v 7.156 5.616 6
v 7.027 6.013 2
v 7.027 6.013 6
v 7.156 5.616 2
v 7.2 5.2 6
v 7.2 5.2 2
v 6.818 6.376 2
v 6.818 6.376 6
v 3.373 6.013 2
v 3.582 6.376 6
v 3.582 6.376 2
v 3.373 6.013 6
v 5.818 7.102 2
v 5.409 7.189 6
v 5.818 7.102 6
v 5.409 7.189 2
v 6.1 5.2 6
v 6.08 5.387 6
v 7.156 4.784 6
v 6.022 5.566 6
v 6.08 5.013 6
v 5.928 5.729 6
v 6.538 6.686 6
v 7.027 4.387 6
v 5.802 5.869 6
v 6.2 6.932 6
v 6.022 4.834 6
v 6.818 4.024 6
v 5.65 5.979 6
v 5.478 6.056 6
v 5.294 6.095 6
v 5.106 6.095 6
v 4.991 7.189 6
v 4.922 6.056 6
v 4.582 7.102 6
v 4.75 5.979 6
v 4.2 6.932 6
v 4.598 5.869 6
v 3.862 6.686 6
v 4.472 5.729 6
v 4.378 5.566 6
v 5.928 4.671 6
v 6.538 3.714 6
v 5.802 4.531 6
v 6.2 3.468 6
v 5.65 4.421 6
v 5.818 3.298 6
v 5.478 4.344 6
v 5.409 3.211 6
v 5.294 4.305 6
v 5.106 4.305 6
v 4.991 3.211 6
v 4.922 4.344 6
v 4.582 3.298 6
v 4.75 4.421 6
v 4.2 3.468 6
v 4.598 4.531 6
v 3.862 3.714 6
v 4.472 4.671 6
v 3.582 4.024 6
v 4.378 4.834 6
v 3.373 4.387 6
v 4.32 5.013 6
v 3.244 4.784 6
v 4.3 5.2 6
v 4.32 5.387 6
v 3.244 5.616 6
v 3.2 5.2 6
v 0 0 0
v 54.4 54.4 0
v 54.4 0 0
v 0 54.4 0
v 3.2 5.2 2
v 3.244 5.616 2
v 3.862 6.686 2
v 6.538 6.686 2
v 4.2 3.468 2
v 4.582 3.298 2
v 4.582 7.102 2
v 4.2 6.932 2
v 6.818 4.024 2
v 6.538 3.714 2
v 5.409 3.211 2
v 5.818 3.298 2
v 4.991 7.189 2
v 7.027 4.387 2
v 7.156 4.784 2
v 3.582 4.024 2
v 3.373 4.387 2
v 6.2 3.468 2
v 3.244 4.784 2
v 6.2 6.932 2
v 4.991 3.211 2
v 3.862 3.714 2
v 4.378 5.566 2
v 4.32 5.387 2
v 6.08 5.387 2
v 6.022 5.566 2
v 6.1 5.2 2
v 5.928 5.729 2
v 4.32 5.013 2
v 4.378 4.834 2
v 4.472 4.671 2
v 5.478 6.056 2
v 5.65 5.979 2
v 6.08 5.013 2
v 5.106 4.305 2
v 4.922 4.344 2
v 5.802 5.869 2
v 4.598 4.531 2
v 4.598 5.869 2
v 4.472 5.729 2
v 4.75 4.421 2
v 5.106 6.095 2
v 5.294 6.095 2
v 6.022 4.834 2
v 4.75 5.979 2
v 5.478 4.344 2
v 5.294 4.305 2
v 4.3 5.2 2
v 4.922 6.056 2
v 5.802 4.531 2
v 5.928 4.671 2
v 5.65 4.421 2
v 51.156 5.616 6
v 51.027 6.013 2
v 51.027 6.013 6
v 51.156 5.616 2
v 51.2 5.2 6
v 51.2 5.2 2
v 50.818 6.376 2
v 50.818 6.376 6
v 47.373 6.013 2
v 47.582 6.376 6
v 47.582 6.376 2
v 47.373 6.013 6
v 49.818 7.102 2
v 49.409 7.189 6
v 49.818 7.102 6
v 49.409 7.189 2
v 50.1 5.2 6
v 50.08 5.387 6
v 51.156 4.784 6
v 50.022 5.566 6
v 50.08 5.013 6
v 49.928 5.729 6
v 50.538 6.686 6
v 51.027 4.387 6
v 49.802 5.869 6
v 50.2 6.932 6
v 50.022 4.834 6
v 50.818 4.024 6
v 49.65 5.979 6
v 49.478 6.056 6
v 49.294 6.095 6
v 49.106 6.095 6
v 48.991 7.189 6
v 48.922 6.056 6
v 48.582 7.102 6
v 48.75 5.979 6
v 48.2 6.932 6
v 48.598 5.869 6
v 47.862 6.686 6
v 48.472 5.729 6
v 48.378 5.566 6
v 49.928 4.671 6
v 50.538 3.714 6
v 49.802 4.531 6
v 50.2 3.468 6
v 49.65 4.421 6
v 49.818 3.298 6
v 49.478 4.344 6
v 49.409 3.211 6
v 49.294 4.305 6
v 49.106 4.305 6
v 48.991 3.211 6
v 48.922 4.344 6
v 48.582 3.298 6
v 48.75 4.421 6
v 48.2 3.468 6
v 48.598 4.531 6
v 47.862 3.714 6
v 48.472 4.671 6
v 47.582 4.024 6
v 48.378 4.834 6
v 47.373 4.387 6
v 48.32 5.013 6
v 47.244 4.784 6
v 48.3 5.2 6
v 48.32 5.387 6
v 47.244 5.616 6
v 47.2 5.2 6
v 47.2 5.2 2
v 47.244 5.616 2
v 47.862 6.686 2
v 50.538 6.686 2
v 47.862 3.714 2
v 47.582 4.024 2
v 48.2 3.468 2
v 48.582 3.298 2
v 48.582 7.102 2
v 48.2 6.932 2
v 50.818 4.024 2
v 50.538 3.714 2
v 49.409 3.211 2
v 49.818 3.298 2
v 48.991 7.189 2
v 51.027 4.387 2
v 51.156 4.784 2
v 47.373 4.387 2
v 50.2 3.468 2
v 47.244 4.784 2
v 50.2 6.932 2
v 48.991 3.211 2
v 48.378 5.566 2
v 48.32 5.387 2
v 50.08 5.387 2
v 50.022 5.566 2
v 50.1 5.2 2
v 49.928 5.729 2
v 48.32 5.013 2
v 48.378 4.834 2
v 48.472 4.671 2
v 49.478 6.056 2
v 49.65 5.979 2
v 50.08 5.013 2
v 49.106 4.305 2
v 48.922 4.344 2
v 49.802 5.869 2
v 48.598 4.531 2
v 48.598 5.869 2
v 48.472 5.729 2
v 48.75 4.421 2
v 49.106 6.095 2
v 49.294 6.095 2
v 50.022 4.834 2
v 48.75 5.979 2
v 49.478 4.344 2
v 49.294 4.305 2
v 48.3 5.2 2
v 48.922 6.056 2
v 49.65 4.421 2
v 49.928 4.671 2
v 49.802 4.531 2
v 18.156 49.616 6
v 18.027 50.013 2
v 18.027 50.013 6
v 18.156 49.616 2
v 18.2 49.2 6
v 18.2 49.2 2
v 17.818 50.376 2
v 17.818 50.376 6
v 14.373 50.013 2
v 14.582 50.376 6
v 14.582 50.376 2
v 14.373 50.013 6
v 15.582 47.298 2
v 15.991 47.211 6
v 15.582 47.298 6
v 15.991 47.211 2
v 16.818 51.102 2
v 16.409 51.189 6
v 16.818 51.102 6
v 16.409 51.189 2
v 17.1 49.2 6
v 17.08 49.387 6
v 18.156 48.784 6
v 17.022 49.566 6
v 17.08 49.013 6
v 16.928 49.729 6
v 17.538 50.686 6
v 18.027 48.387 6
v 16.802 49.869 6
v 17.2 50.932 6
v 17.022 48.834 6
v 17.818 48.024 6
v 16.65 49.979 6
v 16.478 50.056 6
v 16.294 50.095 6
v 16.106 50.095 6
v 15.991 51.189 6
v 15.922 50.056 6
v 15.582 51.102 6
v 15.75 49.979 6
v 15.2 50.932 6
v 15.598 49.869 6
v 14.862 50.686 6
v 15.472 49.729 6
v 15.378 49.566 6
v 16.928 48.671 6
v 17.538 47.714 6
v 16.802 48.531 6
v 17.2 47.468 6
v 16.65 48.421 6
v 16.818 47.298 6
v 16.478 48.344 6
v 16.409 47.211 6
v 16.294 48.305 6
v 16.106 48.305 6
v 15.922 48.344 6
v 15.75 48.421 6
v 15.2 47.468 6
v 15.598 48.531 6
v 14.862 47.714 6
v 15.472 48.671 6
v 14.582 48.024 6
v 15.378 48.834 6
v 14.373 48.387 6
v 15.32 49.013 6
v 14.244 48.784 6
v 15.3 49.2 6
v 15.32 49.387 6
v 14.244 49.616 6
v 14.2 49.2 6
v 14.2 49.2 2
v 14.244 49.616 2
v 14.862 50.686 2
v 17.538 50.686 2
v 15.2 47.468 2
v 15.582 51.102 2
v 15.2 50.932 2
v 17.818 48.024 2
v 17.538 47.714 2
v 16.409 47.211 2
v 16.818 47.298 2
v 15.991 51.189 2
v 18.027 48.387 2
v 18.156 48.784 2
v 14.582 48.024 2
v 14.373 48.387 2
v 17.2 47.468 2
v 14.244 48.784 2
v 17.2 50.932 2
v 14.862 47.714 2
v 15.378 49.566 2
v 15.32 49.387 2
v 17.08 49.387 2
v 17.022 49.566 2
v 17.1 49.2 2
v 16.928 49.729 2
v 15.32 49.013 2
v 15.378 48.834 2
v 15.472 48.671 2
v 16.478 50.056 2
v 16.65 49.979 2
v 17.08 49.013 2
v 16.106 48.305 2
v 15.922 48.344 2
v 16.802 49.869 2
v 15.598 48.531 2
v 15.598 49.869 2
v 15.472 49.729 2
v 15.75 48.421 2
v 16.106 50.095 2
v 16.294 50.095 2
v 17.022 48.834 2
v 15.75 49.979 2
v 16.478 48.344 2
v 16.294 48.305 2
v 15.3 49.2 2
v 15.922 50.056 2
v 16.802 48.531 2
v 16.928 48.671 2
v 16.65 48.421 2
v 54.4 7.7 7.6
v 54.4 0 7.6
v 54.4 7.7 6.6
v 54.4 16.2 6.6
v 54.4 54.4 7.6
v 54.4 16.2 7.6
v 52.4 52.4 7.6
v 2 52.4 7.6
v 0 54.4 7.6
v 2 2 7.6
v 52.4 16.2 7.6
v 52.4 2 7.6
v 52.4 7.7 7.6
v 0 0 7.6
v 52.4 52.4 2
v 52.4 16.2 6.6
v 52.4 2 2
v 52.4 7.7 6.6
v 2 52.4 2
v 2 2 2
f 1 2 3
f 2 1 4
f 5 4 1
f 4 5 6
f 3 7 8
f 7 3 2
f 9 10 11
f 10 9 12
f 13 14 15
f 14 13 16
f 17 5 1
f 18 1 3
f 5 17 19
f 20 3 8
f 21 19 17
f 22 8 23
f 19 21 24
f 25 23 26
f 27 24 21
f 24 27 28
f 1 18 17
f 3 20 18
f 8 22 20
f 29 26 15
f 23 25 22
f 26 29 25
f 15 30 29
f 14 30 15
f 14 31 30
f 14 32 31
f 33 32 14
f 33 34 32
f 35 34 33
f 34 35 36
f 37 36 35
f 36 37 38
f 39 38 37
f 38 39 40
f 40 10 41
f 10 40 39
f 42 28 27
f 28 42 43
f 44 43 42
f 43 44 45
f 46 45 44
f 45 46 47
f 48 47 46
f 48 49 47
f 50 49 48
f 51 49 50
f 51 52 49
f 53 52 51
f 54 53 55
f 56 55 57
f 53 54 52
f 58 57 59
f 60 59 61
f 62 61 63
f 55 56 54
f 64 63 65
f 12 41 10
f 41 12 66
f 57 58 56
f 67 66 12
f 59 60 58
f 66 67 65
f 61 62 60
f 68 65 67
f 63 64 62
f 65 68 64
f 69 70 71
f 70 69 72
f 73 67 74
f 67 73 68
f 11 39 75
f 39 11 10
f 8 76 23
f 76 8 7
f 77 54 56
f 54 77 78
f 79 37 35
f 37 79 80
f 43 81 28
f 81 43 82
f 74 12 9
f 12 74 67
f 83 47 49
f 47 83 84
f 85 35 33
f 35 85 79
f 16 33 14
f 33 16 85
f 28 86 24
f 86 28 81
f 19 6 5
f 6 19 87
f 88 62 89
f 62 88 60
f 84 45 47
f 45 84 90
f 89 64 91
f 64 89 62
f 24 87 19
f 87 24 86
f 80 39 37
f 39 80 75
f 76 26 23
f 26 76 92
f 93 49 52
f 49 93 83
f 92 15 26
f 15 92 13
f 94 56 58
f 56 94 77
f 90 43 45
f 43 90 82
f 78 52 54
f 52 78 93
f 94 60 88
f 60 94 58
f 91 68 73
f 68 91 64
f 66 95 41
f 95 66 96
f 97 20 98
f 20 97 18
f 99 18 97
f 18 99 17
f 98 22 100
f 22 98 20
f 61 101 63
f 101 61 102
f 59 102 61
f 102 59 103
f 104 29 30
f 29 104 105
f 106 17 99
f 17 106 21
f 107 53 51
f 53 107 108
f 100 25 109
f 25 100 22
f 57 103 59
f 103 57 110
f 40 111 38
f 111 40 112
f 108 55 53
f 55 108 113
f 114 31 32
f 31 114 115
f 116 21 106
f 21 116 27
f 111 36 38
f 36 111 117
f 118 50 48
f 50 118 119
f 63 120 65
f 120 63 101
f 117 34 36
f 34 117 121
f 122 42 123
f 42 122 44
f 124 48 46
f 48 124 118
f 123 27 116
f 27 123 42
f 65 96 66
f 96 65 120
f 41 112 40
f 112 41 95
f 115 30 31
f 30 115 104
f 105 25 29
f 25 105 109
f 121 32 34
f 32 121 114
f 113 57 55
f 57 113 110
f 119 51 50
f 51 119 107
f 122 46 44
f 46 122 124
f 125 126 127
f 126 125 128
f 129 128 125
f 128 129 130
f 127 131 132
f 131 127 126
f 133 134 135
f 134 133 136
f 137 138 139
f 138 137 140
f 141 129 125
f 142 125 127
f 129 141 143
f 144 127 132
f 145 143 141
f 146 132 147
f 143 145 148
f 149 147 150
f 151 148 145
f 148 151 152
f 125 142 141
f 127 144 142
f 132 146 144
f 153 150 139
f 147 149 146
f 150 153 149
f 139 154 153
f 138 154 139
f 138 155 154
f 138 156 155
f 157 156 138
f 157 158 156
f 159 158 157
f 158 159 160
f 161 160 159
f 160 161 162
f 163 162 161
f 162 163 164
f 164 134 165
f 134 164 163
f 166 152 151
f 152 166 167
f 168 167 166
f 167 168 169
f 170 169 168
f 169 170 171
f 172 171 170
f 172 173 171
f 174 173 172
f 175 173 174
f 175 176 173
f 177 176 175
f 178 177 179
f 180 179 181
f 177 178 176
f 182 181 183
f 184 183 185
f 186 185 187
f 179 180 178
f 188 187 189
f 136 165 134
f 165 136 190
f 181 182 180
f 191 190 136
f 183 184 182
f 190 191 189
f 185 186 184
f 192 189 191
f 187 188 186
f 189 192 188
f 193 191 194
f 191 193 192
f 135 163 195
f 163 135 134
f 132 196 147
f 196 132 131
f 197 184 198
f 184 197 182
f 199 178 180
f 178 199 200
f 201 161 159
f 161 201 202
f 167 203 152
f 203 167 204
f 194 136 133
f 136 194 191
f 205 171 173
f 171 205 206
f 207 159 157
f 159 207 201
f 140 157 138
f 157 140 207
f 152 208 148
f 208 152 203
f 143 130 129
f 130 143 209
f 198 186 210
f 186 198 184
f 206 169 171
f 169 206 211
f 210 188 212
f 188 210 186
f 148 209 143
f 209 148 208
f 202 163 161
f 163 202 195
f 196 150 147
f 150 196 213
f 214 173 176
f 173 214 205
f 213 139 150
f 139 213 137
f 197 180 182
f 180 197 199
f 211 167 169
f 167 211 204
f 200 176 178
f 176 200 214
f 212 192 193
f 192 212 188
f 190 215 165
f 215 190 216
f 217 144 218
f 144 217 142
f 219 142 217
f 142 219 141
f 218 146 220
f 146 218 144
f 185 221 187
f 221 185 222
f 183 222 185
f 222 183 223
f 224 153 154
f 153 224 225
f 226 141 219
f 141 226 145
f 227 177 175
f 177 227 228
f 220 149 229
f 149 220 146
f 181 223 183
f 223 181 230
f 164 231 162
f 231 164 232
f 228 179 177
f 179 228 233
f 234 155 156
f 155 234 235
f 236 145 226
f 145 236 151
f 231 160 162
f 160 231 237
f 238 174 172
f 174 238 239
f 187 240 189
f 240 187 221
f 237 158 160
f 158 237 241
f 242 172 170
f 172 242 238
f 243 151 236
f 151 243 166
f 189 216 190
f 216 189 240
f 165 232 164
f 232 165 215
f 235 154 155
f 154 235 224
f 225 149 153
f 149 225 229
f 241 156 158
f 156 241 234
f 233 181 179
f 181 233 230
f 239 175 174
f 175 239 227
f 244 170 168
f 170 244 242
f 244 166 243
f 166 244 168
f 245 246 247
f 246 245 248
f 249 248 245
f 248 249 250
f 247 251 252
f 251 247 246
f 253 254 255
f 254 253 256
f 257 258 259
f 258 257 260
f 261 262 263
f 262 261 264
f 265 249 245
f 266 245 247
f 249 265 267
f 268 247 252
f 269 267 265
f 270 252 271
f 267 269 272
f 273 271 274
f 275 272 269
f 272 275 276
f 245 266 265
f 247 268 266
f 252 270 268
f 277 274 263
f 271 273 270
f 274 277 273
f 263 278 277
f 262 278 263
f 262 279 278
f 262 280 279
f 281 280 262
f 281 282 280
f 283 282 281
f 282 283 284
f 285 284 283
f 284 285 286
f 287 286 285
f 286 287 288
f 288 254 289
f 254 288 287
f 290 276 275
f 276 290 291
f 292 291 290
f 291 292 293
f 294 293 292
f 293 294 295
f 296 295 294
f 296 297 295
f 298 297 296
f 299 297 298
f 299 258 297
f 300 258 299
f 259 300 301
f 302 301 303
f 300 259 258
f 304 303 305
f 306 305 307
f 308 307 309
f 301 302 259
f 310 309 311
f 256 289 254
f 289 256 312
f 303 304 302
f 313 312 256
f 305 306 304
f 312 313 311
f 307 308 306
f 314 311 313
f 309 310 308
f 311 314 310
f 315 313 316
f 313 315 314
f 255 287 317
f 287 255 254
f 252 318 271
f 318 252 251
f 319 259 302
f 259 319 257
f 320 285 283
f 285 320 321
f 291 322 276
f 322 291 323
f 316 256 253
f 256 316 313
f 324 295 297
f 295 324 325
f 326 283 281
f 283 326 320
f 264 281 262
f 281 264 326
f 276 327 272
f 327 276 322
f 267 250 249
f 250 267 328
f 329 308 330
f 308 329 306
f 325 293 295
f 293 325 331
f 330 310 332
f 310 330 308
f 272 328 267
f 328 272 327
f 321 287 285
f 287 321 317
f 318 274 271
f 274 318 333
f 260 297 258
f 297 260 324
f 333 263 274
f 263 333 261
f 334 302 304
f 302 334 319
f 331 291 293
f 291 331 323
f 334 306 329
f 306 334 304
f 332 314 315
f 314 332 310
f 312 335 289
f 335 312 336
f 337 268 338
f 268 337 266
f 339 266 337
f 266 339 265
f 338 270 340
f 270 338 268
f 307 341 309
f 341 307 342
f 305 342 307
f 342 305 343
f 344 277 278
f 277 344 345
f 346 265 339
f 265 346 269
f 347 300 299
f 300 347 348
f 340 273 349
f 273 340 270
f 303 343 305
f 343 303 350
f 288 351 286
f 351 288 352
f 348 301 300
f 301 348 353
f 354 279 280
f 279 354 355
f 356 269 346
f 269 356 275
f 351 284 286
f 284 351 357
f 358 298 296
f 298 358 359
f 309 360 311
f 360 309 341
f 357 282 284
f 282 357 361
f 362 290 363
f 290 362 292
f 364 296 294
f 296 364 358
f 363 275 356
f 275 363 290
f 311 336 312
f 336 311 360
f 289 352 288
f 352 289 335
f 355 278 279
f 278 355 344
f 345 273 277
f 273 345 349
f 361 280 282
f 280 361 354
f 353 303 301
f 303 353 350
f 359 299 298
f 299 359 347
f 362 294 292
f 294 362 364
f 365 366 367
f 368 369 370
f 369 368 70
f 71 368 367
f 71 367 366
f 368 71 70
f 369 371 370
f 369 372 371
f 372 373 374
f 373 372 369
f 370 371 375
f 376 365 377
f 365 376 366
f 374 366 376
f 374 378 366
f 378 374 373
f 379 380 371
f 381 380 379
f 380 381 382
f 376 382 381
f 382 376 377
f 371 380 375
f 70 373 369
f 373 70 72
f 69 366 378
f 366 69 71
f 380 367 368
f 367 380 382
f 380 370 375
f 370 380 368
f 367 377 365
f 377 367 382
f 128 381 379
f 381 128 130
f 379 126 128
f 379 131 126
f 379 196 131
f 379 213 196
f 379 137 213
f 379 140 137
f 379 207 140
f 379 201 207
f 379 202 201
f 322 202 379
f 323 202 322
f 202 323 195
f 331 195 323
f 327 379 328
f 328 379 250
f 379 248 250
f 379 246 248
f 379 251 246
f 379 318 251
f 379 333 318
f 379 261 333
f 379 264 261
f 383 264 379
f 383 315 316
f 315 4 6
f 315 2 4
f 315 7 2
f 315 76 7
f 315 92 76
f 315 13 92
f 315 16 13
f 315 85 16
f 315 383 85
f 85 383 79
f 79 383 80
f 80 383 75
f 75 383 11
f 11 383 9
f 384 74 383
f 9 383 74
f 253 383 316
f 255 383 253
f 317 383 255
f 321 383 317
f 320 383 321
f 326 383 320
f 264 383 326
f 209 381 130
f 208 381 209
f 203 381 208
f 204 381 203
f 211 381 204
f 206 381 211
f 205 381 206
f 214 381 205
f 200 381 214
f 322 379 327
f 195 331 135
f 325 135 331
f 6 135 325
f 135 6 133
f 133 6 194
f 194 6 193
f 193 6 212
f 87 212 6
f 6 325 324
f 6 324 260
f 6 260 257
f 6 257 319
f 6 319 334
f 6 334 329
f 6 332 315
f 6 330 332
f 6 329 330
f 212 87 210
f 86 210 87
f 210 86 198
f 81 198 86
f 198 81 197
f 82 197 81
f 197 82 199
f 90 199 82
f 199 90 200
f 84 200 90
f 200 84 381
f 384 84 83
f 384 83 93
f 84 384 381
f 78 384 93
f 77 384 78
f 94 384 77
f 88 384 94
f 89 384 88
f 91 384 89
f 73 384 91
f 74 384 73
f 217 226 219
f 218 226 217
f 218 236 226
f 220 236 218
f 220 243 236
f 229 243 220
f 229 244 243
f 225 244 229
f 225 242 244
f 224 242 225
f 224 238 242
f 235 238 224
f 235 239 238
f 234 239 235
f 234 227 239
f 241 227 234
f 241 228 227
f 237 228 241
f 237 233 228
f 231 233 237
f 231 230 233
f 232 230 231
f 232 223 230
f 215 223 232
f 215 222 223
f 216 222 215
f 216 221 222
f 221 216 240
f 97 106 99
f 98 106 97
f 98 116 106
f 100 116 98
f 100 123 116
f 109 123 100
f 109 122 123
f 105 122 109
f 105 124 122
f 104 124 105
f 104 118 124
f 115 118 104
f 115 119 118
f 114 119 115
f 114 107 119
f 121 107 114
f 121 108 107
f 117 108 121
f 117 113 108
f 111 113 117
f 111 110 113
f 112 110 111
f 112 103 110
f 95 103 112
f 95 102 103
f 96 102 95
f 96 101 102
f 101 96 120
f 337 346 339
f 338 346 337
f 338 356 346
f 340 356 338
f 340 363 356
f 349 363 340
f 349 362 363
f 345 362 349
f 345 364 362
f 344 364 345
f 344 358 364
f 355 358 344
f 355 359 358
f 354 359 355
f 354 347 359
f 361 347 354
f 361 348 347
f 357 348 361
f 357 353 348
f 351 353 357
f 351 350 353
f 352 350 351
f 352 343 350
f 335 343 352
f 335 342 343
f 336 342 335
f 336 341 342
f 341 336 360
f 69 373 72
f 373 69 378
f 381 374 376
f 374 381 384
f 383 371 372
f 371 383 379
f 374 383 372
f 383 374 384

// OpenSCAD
$fs = 0.1;

// Enable parts of the case
mainCaseEnable = true;
topPanelEnable = true;
usbAccessHole = true;

epsilon = 0.001;

// Case
case_thickness = 2;  // Case thickness
case_height = 29;  // Case height
pcb_case_space = 0.2;   // Free space between PCB & case

// PCB
pcbw = 50;  // PCB width
pcbl = 50;  // PCB length
pcbt = 1.6; // PCB thickness

// Board pins
fpx = 3;    // First pin x position from west PCB border
fpy = 3;    // First pin y position from south PCB border
pxd = 39;   // x distance between pins
pxd2 = 30;  // x distance between pins of the second row
pyd = 39;   // y distance between pins

// USB connector
usb_y_pos = 9.75; // y position of the USB connector from south PCB border
usb_width = 8.5;

// Screw terminals
aisty = 6;  // y position from south PCB border (AIS)
sth = 7;    // Height
stw = 16.1; // Width
stfp = 0.5; // Freespace between hole borders and connectors

// Screw pads
spw = 10;   // Pad width
sdia = 3.2; // screw diameter

// RF Antenna
antw = 7;  // Hole diameter
anty = 41; // y position of the antenna hole from south PCB border
antz = 14; // z position of the antenna hole from PCB surface

// Board pin definition
ph = 4;     // Height
pr = 2;     // Radius
pshr = 0.9; // Screw hole radius
module boardPin(x, y)
{
    difference()
    { // Pin
        translate([ x, y, 0 ]) cylinder(ph + case_thickness, pr, pr);
        // Screw hole
        translate([ x, y, 0 ]) cylinder(ph + case_thickness + 0.1, pshr, pshr);
    }
}

// Screw pad definition
module screwPad()
{
    difference()
    {
        cube([ spw, spw, case_thickness + 1 ]);
        translate([ spw / 2, spw / 2, -1 ]) cylinder(case_thickness + 3, sdia / 2 + 0.1, sdia / 2 + 0.1);
        translate([ spw / 2, spw / 2, 1.5 + 0.01 ]) cylinder(1.5, sdia / 2 + 0.1, sdia / 2 + 1.8 + 0.1);
    }
}

if (mainCaseEnable == true)
{
    // Bottom panel
    cube([ pcbw + case_thickness * 2 + pcb_case_space * 2, pcbl + case_thickness * 2 + pcb_case_space * 2, case_thickness ]);

    // Board pins
    boardPin(case_thickness + pcb_case_space + 3, case_thickness + pcb_case_space + 3);
    boardPin(case_thickness + pcb_case_space + pcbw - 3, case_thickness + pcb_case_space + 3);
    boardPin(case_thickness + pcb_case_space + 14, case_thickness + pcb_case_space + pcbl - 3);

    cube([ pcbw + case_thickness * 2 + pcb_case_space * 2, case_thickness, pcbt + ph + case_thickness], center = false);
    translate([0, pcbl + case_thickness + pcb_case_space * 2, 0])
        cube([ pcbw + case_thickness * 2 + pcb_case_space * 2, case_thickness, pcbt + ph + case_thickness], center = false);
    cube([ case_thickness, pcbl + case_thickness * 2 + pcb_case_space * 2, pcbt + ph + case_thickness], center = false);
    translate([pcbw + case_thickness * 1 + pcb_case_space * 2, 0, 0]) {
        difference() {
            cube([ case_thickness, pcbl + case_thickness * 2 + pcb_case_space * 2, pcbt + ph + case_thickness], center = false);
            translate([-epsilon, usb_y_pos - usb_width / 2 + case_thickness + pcb_case_space, pcbt + ph - 1 + case_thickness])
                cube([ case_thickness + 2 * epsilon, usb_width, 1 + epsilon], center = false);
        }
    };
};
